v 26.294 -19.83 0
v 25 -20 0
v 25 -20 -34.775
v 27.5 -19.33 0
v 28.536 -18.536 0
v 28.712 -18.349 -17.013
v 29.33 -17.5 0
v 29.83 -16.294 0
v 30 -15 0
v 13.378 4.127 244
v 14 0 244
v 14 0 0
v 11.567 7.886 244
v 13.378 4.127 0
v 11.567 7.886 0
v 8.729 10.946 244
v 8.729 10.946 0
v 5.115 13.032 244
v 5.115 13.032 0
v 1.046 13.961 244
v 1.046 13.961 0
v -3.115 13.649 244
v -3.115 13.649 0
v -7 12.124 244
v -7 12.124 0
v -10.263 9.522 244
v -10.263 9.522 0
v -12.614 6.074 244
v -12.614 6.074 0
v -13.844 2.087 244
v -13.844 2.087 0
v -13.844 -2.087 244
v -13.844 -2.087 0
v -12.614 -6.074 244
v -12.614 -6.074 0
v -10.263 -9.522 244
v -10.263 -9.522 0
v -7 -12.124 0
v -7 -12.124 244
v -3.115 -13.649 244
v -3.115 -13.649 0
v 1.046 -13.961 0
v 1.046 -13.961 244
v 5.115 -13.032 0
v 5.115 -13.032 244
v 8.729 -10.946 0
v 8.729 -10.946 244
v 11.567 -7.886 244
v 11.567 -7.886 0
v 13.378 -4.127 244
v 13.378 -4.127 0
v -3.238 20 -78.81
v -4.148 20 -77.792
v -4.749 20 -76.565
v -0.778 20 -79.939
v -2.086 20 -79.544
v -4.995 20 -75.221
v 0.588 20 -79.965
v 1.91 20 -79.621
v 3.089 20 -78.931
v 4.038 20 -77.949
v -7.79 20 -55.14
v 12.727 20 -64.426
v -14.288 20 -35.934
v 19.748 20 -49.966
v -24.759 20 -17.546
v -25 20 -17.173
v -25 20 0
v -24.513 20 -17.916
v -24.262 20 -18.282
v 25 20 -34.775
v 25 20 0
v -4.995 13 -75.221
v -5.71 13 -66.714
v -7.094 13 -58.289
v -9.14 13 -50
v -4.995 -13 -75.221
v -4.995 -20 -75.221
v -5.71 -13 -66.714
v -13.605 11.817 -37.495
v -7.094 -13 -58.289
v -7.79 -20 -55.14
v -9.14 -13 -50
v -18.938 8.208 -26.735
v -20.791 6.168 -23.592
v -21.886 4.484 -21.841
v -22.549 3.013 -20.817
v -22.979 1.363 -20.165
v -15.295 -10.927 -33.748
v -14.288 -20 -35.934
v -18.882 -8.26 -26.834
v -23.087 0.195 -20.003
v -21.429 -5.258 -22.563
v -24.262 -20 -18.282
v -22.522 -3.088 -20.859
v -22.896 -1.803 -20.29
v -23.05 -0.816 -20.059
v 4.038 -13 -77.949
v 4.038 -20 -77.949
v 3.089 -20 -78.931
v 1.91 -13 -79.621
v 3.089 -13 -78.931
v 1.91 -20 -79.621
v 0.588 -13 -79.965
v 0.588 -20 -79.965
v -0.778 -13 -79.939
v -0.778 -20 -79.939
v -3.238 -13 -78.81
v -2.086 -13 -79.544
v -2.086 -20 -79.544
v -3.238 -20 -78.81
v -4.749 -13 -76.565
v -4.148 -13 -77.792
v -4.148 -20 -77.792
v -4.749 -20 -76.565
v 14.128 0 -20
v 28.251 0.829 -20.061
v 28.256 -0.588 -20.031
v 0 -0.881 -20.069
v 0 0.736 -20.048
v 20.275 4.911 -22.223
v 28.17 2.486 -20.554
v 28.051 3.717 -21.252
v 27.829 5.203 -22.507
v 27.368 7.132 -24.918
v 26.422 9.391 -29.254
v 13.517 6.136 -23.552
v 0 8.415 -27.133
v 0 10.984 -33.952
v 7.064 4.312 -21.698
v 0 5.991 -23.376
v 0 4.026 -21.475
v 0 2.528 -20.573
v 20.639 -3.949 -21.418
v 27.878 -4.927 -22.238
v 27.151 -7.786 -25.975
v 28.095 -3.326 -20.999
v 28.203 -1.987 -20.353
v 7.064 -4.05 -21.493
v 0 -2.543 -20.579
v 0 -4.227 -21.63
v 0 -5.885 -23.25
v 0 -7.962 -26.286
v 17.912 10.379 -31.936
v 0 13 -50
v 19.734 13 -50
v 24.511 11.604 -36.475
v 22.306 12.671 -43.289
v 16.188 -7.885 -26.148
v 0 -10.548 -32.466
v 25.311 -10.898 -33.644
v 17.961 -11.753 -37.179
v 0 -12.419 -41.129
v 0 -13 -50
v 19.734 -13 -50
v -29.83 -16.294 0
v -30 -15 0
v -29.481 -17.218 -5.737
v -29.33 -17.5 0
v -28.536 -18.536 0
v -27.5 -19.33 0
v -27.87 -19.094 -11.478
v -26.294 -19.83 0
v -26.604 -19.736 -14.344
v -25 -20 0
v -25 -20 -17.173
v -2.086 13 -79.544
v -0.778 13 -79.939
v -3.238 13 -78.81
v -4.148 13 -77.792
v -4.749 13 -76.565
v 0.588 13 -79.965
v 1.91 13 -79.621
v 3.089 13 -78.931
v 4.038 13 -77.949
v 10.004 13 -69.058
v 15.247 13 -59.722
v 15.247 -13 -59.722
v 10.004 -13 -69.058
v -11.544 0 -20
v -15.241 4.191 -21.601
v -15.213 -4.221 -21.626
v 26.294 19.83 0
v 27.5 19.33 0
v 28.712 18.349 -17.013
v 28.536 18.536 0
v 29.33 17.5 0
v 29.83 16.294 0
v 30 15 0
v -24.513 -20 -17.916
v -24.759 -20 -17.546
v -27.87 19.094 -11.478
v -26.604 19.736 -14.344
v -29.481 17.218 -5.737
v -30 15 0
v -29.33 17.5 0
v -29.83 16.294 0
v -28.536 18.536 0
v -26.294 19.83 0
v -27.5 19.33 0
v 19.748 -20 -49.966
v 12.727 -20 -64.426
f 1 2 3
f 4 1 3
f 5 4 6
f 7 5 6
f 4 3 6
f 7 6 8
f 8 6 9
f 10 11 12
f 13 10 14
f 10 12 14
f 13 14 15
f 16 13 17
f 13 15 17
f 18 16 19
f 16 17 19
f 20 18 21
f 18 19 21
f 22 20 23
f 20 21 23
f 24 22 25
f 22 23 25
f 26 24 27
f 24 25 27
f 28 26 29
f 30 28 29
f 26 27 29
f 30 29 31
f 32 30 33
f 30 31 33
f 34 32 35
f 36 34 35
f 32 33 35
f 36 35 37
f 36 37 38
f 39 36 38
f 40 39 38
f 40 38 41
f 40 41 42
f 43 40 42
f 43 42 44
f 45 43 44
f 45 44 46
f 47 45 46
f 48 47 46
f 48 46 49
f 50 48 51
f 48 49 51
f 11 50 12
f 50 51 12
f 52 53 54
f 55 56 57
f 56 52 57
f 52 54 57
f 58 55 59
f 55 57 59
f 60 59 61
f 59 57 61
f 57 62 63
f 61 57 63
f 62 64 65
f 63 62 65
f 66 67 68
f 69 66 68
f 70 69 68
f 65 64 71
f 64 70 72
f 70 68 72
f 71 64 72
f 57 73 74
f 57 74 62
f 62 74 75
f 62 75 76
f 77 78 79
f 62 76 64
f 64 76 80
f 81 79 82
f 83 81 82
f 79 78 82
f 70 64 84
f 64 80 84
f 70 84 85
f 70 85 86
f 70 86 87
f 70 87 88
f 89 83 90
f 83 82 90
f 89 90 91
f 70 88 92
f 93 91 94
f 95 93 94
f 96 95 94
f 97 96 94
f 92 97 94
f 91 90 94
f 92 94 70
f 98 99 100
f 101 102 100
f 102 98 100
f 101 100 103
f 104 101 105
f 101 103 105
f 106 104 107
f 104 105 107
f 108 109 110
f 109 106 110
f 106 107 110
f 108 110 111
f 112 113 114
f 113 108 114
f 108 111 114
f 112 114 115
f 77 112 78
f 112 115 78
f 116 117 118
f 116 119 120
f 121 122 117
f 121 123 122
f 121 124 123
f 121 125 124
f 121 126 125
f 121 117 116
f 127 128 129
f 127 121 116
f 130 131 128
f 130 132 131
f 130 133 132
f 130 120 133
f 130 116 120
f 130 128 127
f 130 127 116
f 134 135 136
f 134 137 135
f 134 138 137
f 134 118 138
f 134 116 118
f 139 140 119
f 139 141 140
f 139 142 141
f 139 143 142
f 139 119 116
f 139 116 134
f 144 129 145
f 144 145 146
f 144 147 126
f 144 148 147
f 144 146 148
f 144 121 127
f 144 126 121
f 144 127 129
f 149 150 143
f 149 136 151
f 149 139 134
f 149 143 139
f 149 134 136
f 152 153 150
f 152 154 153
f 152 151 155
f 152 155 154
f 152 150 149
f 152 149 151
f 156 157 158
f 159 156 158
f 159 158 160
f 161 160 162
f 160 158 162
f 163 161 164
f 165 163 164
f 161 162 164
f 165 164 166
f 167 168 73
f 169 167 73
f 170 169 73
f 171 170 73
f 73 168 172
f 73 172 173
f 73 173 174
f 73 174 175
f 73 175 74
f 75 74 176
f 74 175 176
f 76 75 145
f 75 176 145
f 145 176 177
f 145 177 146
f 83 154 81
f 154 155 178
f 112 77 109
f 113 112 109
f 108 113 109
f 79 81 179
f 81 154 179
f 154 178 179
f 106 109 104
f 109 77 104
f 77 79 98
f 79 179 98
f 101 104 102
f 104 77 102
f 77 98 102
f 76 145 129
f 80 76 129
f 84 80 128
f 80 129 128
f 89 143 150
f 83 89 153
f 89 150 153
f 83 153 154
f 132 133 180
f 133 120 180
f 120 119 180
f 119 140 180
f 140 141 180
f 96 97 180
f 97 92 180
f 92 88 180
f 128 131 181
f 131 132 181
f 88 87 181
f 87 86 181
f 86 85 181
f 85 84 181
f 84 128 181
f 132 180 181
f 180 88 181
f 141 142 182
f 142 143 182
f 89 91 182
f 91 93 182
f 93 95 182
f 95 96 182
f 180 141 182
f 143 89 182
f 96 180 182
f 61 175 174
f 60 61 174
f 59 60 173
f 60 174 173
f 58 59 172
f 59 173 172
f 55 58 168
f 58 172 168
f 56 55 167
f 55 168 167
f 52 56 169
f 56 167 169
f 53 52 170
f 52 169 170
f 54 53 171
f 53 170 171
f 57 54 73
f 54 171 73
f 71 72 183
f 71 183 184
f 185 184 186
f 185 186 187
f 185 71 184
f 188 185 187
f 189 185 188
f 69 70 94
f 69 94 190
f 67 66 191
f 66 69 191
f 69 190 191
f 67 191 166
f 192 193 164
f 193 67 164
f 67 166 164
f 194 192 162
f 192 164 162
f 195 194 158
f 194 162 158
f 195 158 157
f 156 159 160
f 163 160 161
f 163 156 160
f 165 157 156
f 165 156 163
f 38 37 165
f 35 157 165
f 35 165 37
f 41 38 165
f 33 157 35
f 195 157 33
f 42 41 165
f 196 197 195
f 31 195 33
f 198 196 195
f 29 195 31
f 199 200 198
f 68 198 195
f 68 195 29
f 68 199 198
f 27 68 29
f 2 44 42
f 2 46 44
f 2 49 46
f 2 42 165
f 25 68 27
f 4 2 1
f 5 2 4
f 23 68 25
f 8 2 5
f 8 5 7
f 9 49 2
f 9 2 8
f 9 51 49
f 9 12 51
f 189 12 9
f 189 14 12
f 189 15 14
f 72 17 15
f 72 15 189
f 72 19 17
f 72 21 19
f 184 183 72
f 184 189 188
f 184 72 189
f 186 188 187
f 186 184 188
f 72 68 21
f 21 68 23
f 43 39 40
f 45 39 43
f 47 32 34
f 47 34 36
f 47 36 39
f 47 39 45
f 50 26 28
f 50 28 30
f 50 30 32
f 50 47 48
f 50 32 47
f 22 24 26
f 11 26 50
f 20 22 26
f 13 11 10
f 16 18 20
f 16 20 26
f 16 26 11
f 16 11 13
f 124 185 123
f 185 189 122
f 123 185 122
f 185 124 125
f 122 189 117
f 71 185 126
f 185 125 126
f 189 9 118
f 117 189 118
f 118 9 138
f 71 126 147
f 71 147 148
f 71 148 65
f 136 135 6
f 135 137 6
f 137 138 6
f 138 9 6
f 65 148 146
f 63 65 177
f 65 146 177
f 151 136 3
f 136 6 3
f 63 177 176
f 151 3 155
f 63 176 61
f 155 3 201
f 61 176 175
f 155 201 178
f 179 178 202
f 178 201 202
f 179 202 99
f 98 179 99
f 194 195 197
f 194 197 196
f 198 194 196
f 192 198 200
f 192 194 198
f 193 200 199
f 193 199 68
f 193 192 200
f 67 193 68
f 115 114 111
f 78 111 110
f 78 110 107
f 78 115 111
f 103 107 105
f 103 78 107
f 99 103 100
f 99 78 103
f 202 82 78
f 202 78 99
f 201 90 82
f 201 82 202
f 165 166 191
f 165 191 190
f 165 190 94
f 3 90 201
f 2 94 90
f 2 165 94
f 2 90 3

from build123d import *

# Parameters (mm, degrees)
F0_R     = 14
F1_DEPTH = 244
F2_W     = 60
F2_H     = 40
F3_DEPTH = 80
F4_R     = 5
F6_DEPTH = 40
F8_DEPTH = 35


with BuildPart() as f1:
    # F0 (on Top) → F1 (new body)
    with BuildSketch(Plane.XY):
        Circle(F0_R)
    extrude(amount=F1_DEPTH)

    # F2 (on Top) → F3 (join)
    with BuildSketch(Plane.XY):
        Rectangle(F2_W, F2_H)
    extrude(amount=-F3_DEPTH)

    # F4
    f4_edges = [f1.edges().sort_by_distance(p)[0] for p in [
        (30, -20, -40),
        (30, 20, -40),
        (-30, -20, -40),
        (-30, 20, -40),
    ]]
    fillet(f4_edges, radius=F4_R)

    # F5 (on Front) → F6 (cut, symmetric)
    with BuildSketch(Plane.XZ):
        with BuildLine():
            Line((-30, 0), (-30, -90))
            Line((-30, -90), (30, -90))
            Line((30, -90), (30, 0))
            ThreePointArc((30, 0), (23.0927925952, -40.9972362717), (4.0380677708, -77.9485604417))
            ThreePointArc((4.0380677708, -77.9485604417), (2.2646410082, -79.4577349746), (0, -80))
            ThreePointArc((0, -80), (-3.4564291769, -78.6129070491), (-4.9951029351, -75.2212389381))
            ThreePointArc((-4.9951029351, -75.2212389381), (-10.5871286649, -45.3841026089), (-24.2616371934, -18.2818283023))
            ThreePointArc((-24.2616371934, -18.2818283023), (-28.5317146762, -9.5806322048), (-30, 0))
        make_face()
    extrude(amount=F6_DEPTH, both=True, mode=Mode.SUBTRACT)

    # F7 (on Right) → F8 (cut, symmetric)
    with BuildSketch(Plane.YZ):
        with BuildLine():
            Line((13, -80), (13, -50))
            add(Edge.make_bspline(
                [(13, -50), (13, -20), (0, -20), (-13, -20), (-13, -50)],
                knots=[1.5707963268, 1.5707963268, 1.5707963268, 3.1415926536, 3.1415926536, 4.7123889804, 4.7123889804, 4.7123889804], degree=2, weights=[1, 0.7071067812, 1, 0.7071067812, 1]))
            Line((-13, -50), (-13, -80))
            Line((-13, -80), (13, -80))
        make_face()
    extrude(amount=F8_DEPTH, both=True, mode=Mode.SUBTRACT)


solid = f1.part
